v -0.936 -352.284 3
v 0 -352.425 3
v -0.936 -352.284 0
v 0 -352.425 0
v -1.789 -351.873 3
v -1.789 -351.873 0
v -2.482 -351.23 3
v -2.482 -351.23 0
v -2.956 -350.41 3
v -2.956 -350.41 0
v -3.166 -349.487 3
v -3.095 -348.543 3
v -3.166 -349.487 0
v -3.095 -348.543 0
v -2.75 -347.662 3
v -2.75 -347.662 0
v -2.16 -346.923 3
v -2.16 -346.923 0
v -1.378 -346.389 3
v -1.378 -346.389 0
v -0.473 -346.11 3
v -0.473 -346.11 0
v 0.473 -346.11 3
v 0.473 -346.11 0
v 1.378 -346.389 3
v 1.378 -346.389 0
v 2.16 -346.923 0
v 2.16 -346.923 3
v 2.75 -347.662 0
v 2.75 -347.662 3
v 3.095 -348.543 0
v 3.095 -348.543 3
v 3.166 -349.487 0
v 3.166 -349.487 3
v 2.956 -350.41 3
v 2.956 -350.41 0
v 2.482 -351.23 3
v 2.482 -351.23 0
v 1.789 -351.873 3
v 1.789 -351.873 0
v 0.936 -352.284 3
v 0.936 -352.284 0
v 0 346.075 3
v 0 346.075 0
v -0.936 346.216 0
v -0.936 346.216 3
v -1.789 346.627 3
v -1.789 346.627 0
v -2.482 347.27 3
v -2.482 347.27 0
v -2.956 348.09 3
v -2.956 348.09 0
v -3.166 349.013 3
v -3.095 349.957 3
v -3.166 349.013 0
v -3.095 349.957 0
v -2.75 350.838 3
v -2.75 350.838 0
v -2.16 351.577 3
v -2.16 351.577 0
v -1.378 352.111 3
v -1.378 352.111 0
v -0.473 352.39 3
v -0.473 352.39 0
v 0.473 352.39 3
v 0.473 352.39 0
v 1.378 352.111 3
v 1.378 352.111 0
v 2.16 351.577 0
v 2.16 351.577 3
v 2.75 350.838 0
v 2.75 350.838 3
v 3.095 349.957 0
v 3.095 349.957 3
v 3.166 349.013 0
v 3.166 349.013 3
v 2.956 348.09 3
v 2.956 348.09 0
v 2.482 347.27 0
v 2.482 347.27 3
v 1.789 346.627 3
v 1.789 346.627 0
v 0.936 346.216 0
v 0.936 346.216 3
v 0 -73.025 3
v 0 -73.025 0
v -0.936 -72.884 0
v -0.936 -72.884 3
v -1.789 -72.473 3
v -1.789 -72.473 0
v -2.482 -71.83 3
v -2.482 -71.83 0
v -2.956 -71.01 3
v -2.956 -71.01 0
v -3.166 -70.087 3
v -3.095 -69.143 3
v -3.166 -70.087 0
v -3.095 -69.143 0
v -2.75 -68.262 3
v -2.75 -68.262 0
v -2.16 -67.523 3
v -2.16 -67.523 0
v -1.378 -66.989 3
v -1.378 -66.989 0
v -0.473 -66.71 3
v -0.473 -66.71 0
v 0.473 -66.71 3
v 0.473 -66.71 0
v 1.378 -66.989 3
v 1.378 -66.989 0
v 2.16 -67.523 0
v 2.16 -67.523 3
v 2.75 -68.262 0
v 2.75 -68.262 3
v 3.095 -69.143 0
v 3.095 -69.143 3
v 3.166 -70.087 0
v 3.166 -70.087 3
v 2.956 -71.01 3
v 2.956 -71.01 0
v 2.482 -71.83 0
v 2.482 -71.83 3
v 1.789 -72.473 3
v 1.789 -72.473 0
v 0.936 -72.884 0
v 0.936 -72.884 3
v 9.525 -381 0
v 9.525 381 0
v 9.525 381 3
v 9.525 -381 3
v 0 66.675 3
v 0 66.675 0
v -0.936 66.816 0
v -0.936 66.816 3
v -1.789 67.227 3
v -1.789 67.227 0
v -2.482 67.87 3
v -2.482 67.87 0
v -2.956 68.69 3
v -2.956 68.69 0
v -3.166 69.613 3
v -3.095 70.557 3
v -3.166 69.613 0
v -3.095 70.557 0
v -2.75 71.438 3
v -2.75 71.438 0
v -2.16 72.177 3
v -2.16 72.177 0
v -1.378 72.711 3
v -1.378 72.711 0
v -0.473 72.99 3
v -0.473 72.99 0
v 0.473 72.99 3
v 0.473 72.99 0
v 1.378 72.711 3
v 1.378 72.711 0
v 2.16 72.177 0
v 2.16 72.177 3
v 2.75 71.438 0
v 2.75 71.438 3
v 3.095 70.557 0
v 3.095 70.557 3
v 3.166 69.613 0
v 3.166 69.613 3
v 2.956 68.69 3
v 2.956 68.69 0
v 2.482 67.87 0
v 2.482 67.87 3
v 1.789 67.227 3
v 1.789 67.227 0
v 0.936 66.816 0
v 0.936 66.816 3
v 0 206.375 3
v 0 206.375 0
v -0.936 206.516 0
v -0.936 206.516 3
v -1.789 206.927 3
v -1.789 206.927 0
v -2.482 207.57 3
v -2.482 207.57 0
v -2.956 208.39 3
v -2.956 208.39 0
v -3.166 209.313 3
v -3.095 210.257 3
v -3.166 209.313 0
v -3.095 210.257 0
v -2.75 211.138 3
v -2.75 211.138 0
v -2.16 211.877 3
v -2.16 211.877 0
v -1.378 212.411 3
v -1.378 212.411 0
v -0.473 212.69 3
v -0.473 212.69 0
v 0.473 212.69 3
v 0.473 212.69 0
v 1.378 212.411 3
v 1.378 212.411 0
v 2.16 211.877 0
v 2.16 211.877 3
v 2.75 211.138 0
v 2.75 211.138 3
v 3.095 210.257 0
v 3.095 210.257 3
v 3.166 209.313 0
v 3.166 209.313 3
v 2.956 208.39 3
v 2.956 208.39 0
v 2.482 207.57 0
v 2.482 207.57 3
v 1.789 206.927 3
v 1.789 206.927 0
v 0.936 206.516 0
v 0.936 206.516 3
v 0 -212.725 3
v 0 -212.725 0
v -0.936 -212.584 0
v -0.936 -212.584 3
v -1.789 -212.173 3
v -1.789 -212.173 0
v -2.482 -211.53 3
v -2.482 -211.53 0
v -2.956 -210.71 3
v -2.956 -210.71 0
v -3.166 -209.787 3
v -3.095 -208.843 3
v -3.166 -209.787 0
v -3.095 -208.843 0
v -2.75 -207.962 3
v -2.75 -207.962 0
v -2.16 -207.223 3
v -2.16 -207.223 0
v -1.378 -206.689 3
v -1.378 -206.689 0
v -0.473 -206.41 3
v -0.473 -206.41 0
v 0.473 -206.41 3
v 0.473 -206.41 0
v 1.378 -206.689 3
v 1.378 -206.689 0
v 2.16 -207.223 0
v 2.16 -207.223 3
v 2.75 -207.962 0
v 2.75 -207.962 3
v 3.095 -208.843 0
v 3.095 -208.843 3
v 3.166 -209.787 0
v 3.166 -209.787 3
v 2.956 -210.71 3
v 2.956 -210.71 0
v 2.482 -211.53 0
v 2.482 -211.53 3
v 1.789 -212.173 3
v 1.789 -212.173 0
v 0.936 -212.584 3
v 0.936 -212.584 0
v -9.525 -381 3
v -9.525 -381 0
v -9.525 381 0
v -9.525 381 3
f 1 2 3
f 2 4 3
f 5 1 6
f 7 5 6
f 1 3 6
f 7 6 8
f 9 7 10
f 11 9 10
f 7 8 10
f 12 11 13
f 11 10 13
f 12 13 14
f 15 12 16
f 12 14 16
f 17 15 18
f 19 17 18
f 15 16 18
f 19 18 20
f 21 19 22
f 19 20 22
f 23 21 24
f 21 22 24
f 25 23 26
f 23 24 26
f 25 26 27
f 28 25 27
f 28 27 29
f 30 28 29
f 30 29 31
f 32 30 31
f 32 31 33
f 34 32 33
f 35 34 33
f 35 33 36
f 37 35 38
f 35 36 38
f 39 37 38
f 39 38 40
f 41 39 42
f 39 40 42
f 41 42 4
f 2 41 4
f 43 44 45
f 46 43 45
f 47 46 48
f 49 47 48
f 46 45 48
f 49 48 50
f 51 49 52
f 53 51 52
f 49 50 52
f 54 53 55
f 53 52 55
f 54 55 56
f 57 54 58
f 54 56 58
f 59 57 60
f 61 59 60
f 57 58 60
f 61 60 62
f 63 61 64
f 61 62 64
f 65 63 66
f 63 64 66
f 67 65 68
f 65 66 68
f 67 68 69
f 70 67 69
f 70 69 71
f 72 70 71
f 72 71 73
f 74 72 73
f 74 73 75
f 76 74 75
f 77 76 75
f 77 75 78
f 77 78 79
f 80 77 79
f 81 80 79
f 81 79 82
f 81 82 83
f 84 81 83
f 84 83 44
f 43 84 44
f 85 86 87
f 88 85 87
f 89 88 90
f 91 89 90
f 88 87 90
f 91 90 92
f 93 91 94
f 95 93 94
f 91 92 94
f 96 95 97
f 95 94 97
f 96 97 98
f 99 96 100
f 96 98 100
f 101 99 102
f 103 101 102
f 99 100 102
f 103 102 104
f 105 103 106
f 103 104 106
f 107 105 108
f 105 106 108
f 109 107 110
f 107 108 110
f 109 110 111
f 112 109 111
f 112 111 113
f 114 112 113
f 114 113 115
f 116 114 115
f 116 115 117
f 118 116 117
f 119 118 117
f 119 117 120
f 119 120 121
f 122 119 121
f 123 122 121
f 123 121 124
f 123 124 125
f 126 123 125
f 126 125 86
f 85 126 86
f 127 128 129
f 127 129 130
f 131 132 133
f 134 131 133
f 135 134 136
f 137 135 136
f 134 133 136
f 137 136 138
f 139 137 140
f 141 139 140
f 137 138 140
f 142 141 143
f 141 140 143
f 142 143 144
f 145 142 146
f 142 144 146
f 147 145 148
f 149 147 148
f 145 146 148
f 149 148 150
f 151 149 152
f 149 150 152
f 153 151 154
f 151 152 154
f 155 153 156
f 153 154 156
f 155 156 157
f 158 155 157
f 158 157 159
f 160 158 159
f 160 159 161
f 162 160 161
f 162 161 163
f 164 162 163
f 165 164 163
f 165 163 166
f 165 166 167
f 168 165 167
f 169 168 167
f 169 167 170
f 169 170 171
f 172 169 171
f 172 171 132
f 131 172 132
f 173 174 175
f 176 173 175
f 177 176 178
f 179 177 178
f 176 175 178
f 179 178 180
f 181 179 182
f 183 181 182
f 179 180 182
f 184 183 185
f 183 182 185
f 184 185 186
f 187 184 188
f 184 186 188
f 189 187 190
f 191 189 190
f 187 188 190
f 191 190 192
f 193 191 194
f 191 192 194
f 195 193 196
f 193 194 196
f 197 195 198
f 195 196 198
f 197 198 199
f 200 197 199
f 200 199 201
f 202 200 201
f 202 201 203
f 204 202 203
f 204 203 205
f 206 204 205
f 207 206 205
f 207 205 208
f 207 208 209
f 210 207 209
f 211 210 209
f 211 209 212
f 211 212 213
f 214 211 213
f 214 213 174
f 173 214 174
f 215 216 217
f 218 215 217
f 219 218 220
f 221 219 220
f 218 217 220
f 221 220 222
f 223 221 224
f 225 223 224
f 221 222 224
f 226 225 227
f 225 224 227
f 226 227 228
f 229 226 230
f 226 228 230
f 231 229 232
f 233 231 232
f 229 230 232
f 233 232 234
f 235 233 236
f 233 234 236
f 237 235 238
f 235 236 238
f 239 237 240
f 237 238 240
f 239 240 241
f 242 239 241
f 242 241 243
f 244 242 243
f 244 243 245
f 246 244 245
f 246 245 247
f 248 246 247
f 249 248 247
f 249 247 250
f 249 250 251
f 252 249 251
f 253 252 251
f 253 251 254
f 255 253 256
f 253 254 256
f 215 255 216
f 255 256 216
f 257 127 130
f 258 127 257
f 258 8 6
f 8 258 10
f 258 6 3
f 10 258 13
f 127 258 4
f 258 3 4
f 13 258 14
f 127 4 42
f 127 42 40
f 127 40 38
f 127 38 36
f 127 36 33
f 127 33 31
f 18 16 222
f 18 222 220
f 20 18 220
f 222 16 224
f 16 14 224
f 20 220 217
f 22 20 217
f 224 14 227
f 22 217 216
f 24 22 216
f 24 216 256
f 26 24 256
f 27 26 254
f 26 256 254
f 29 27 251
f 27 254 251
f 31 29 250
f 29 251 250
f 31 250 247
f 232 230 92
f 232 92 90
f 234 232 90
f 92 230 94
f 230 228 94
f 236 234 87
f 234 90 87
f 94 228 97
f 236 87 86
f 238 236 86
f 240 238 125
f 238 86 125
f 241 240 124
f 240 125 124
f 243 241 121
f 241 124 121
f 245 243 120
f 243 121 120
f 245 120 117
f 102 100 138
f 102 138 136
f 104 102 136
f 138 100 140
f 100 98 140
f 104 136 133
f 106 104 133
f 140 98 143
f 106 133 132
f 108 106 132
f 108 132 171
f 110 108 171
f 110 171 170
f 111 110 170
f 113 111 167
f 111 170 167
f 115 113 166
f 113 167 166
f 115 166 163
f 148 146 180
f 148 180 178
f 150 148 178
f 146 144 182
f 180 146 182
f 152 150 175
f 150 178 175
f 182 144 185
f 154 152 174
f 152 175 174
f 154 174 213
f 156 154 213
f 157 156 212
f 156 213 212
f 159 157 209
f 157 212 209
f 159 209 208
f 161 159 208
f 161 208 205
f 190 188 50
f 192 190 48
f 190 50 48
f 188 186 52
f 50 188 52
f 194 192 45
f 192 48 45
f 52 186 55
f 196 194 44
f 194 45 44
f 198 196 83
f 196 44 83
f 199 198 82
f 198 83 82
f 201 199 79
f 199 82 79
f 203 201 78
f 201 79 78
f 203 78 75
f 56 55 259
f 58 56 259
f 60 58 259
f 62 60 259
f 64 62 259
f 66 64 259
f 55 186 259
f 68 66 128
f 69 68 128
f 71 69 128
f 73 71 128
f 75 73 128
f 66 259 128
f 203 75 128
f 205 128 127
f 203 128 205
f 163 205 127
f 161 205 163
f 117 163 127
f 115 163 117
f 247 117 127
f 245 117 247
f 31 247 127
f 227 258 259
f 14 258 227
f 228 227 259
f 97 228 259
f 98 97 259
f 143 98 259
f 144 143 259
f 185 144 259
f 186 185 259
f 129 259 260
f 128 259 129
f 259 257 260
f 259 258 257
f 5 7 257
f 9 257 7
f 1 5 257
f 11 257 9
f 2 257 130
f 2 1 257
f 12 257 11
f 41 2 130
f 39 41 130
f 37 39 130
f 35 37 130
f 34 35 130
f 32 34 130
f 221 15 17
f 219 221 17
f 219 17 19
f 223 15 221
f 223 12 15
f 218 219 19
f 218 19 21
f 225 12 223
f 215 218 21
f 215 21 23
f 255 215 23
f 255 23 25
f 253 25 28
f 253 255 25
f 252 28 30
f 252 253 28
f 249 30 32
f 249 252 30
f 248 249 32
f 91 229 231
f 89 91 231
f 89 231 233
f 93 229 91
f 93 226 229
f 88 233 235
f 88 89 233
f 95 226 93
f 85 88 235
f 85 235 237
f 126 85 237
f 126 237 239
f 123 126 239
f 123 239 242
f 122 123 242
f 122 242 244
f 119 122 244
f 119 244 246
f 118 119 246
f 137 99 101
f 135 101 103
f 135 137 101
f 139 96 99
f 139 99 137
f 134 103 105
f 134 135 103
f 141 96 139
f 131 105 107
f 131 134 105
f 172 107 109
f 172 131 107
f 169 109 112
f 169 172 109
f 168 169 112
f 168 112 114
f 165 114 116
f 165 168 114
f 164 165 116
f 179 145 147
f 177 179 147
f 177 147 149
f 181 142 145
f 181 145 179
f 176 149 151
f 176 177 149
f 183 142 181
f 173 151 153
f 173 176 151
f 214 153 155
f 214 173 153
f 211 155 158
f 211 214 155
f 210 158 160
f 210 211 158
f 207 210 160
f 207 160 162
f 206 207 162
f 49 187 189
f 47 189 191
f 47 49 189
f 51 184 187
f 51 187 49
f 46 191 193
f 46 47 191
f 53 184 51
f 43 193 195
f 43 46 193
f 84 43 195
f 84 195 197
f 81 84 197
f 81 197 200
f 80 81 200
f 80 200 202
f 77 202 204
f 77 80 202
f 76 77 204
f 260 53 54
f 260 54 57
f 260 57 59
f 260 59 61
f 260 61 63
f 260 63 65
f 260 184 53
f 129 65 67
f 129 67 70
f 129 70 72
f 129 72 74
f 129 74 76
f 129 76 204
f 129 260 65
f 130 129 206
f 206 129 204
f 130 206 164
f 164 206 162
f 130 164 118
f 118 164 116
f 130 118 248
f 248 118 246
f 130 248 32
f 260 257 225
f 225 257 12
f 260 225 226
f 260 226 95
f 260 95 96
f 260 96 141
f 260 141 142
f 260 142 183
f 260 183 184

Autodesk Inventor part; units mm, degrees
ref_plane "YZ Plane" through (0, 0, 0) normal (1, 0, 0) x (0, 1, 0)
ref_plane "XZ Plane" through (0, 0, 0) normal (0, 1, 0) x (-1, 0, 0)
ref_plane "XY Plane" through (0, 0, 0) normal (0, 0, 1) x (1, 0, 0)
sketch "Sketch1" plane through (0, 0, 0) normal (0, 0, 1) x (1, 0, 0)
  line L0 (-9.525, 381) -> (9.525, 381)
  line L1 (9.525, 381) -> (9.525, -381)
  line L2 (9.525, -381) -> (-9.525, -381)
  line L3 (-9.525, -381) -> (-9.525, 381)
  point P0 (0, 0)
  point P1 (0, 381)
  point P2 (9.525, 0)
  dimension "d0" = 19.05
  dimension "d1" = 762
extrude "Extrusion1" add sketch "Sketch1" along normal blind 3
sketch "Sketch2" plane through (0, 0, 3) normal (0, 0, 1) x (1, 0, 0)
  line L0 (-9.525, 381) -> (9.525, 381) projected
  line L1 (-9.525, -381) -> (-9.525, 381) projected
  line L2 (9.525, -381) -> (-9.525, -381) projected
  point P0 (0, 0)
  point P1 (0, 349.25)
  point P2 (0, 209.55)
  point P3 (0, 69.85)
  point P4 (0, -69.85)
  point P5 (0, -209.55)
  point P6 (0, -349.25)
  dimension "d4" = 12.7
  dimension "d5" = 31.75
  dimension "d6" = 139.7
  dimension "d7" = 139.7
  dimension "d9" = 139.7
  dimension "d10" = 139.7
  dimension "d11" = 139.7
  dimension "d12" = 31.75
hole "Hole1" at (0, 349.25, 3) at (0, 209.55, 3) at (0, 69.85, 3) at (0, -69.85, 3) at (0, -209.55, 3) at (0, -349.25, 3) direction (0, 0, -1) diameter 6.35 end through all
properties part number "front panels"
